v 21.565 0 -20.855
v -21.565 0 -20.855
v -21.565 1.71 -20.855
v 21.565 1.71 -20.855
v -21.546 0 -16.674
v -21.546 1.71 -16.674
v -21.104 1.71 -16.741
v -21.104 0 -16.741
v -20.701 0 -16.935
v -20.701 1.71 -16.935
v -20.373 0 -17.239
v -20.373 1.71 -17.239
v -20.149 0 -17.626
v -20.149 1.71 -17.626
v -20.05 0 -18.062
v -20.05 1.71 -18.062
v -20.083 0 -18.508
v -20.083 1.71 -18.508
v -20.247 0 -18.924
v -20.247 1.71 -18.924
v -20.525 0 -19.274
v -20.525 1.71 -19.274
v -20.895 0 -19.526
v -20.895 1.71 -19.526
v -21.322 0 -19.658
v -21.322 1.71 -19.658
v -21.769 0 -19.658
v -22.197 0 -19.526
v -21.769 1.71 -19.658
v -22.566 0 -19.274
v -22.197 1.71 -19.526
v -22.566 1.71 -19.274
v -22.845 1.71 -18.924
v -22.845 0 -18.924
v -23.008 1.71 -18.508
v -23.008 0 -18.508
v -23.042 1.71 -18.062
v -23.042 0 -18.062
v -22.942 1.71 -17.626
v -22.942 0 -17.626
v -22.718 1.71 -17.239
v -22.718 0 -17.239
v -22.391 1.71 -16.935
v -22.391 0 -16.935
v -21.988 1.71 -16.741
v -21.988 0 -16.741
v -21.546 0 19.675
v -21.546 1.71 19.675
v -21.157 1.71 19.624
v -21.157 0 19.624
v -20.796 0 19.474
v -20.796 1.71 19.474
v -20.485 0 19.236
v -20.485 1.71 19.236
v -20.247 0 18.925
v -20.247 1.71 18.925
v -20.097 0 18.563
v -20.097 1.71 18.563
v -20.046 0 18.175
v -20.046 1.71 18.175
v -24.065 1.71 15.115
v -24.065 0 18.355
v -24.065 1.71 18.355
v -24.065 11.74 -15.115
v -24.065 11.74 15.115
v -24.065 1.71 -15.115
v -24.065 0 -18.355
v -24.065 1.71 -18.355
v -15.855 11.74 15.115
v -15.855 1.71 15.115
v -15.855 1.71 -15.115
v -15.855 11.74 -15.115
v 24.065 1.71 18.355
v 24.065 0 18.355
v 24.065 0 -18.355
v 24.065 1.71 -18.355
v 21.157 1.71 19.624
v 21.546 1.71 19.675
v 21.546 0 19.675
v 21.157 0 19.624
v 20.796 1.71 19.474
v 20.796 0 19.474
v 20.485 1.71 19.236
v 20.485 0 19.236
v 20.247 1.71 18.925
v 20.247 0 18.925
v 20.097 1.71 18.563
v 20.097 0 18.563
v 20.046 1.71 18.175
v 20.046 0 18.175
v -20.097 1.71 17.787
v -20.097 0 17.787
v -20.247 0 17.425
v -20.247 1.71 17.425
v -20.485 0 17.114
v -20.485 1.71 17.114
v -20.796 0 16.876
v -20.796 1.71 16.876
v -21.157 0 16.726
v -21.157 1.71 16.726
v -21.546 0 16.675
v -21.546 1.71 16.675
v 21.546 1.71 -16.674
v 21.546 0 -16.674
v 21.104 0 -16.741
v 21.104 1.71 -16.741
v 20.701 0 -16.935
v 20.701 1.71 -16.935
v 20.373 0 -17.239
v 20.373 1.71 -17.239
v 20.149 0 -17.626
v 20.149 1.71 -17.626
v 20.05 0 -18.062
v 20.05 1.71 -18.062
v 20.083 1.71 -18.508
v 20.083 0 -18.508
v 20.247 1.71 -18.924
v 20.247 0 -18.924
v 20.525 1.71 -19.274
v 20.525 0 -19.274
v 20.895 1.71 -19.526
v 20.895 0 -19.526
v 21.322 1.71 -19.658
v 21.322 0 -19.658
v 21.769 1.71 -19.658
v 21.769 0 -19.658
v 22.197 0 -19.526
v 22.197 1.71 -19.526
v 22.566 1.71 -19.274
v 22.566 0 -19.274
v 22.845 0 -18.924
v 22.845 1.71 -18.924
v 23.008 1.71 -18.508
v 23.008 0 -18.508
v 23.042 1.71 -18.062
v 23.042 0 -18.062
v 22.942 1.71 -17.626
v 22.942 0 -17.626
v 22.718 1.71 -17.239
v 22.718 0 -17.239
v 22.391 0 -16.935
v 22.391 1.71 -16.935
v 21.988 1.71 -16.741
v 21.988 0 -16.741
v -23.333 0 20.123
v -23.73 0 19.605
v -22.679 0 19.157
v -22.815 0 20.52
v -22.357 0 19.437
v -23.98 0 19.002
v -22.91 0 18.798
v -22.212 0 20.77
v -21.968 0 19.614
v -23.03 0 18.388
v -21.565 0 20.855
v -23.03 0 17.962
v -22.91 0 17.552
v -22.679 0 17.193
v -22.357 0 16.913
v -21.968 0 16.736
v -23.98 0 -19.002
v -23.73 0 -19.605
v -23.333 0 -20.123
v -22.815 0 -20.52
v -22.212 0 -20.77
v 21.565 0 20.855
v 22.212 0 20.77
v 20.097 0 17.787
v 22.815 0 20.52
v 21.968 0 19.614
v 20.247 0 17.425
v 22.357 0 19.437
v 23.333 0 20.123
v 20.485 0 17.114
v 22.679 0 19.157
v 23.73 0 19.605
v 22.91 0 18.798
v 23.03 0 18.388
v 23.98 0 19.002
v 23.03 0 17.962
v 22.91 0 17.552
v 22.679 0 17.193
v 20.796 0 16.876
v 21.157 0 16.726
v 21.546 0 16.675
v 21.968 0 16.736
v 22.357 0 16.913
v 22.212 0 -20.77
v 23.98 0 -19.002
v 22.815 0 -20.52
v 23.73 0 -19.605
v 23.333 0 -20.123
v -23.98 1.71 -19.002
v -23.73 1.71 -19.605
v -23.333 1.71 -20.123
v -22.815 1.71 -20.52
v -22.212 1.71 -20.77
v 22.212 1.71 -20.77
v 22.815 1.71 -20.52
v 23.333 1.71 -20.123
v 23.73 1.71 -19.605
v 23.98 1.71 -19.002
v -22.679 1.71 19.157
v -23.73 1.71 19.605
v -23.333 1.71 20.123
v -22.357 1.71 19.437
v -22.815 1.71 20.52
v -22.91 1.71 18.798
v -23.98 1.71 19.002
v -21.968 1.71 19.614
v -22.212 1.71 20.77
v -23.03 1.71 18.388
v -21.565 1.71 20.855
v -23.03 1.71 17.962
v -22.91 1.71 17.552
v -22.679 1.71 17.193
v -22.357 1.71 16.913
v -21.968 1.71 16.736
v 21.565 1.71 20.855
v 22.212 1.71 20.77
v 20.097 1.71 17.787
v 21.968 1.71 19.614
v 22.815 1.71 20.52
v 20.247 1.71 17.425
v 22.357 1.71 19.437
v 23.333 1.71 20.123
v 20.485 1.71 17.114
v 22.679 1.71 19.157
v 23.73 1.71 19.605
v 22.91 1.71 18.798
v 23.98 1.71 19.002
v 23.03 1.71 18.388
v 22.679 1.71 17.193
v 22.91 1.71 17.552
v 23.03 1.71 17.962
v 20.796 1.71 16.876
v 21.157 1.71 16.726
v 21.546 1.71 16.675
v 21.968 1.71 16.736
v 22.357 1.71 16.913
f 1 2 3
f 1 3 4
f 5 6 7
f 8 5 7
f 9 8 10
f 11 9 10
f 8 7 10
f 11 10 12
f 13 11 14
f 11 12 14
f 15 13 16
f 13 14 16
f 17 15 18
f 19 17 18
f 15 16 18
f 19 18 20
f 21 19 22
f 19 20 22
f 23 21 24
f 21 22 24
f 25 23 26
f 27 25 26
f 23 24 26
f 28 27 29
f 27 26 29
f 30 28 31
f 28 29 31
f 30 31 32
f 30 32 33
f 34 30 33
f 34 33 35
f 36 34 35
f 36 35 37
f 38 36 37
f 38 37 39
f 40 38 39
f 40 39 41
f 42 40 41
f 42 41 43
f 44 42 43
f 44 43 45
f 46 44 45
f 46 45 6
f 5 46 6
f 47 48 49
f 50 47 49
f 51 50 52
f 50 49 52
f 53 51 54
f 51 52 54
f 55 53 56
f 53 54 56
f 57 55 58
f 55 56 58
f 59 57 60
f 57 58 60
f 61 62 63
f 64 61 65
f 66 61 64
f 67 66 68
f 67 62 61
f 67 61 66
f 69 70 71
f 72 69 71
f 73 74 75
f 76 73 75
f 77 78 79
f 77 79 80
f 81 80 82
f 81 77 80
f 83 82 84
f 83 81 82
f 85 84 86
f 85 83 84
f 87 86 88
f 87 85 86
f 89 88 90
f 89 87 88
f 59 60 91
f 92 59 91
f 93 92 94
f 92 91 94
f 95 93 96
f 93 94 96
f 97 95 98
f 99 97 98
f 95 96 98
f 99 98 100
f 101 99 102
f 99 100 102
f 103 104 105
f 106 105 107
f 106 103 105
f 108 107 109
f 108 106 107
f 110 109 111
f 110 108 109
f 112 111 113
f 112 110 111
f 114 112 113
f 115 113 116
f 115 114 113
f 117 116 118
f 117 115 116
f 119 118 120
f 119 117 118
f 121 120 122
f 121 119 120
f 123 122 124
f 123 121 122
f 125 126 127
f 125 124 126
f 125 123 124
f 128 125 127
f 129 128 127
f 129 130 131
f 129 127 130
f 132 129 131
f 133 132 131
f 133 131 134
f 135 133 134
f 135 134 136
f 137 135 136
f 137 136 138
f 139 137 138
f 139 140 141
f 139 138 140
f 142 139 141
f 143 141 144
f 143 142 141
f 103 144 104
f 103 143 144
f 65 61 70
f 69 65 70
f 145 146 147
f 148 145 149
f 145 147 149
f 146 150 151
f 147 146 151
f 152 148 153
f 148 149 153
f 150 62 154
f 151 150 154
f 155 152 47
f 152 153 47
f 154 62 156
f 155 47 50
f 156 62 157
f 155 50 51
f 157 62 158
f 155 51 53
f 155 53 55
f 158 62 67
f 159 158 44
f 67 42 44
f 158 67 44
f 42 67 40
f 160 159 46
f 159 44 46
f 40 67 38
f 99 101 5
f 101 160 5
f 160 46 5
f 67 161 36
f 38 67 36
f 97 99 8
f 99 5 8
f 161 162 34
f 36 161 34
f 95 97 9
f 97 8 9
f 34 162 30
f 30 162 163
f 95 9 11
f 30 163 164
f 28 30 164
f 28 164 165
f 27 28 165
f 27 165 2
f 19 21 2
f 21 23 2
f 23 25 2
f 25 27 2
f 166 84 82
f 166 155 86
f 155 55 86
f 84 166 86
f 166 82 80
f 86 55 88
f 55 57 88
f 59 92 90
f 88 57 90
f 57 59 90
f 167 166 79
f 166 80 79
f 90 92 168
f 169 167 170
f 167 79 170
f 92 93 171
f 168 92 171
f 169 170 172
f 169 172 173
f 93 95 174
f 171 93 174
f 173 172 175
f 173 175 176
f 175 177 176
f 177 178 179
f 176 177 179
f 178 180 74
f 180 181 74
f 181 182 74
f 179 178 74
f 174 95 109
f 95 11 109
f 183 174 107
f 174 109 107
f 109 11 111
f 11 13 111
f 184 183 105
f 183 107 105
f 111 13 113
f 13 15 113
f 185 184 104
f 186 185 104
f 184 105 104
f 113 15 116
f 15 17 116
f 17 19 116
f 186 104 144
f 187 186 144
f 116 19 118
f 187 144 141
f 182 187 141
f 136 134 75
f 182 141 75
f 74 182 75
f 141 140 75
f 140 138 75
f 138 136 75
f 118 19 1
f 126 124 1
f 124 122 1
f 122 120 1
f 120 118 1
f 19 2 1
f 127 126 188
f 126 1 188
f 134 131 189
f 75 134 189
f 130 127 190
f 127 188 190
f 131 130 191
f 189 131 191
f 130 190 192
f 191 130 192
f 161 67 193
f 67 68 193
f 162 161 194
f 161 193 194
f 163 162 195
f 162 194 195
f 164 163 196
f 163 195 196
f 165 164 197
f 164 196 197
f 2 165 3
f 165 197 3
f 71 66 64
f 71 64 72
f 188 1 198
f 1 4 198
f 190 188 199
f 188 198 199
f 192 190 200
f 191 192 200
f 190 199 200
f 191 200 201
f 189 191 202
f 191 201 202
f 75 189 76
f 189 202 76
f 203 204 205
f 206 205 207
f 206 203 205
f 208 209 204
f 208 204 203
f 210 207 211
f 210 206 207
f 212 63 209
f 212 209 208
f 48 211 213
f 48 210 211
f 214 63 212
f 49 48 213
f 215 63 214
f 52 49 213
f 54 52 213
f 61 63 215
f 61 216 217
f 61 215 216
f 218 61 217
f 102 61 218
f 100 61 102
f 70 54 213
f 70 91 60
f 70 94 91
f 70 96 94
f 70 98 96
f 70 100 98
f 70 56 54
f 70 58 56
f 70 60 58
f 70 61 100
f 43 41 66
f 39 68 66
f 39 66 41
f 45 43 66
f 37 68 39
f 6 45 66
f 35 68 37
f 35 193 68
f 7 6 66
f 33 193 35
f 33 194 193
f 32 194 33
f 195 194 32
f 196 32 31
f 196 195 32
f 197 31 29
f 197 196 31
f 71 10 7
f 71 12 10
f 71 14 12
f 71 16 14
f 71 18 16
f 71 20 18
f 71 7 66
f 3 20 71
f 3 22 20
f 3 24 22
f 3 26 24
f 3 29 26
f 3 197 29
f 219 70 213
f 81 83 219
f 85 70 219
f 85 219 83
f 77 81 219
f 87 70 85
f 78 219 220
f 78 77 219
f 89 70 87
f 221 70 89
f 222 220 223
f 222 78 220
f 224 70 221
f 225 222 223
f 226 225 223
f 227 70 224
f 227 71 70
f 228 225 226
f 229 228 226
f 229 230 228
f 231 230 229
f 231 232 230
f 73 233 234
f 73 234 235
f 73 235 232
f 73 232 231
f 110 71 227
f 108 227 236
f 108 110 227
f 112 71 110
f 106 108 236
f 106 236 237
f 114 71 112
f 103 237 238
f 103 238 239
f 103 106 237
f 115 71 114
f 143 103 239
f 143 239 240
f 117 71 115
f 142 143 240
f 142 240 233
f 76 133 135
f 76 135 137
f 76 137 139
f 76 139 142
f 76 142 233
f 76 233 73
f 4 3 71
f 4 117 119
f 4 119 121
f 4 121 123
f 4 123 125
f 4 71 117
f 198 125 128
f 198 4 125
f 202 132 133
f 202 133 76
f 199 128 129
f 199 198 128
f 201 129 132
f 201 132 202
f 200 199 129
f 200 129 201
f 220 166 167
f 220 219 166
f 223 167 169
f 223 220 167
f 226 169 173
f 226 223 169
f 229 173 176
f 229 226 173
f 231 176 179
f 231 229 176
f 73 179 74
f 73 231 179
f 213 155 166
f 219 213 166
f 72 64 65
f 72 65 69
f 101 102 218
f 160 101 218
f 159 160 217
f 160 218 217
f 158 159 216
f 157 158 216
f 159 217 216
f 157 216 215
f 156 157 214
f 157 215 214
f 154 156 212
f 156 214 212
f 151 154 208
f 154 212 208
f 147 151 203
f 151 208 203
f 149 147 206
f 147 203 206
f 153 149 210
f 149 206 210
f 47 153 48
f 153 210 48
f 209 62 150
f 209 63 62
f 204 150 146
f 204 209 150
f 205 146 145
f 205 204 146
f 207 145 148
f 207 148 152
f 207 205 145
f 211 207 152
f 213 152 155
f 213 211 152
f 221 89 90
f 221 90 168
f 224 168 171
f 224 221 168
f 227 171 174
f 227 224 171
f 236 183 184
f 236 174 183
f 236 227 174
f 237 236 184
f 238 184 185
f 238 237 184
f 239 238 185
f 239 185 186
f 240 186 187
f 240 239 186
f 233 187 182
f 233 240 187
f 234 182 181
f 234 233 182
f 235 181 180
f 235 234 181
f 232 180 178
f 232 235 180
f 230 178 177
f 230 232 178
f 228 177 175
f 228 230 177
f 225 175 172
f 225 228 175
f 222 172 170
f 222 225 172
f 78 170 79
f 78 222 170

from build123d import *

# Parameters (mm, degrees)
SKETCH2_W           = 48.13
SKETCH2_H           = 41.71
BOSS_EXTRUDE1_DEPTH = 1.71
SKETCH3_R           = 1.5
CUT_EXTRUDE1_DEPTH  = 10.71
CUT_EXTRUDE2_DEPTH  = 10.71
FILLET3_R           = 2.5
SKETCH8_W           = 8.21
SKETCH8_H           = 30.23
BOSS_EXTRUDE2_DEPTH = 10.03


with BuildPart() as part:
    # Sketch2 → Boss-Extrude1 (new body)
    with BuildSketch(Plane(origin=(0, 0, 0), x_dir=(1, 0, 0), z_dir=(0, 1, 0))):
        Rectangle(SKETCH2_W, SKETCH2_H)
    extrude(amount=BOSS_EXTRUDE1_DEPTH)

    # Sketch3 → Cut-Extrude1 (cut)
    with BuildSketch(Plane(origin=(0, 1.71, 0), x_dir=(1, 0, 0), z_dir=(0, 1, 0))):
        with Locations(Location((-21.545702182, 18.174313444, 0), (0, 0, 270))):
            Circle(SKETCH3_R)
    cut_extrude1 = extrude(amount=-CUT_EXTRUDE1_DEPTH, mode=Mode.SUBTRACT)

    # Sketch4 → Cut-Extrude2 (cut)
    with BuildSketch(Plane(origin=(0, 1.71, 0), x_dir=(1, 0, 0), z_dir=(0, 1, 0))):
        with BuildLine():
            ThreePointArc((-20.045702182, -18.175), (-20.485042011, -17.114339828), (-21.545702182, -16.675))
            Line((-21.545702182, -16.675), (-21.545702182, -18.175))
            Line((-21.545702182, -18.175), (-21.545702182, -19.675))
            ThreePointArc((-21.545702182, -19.675), (-20.485042011, -19.235660172), (-20.045702182, -18.175))
        make_face()
        with BuildLine():
            Line((-21.545702182, -18.175), (-21.545702182, -16.675))
            ThreePointArc((-21.545702182, -16.675), (-23.045702182, -18.175), (-21.545702182, -19.675))
            Line((-21.545702182, -19.675), (-21.545702182, -18.175))
        make_face()
    cut_extrude2 = extrude(amount=-CUT_EXTRUDE2_DEPTH, mode=Mode.SUBTRACT)

    # Fillet3
    fillet3_edges = [part.edges().sort_by_distance(p)[0] for p in [
        (24.065, 0.855, 20.855),
        (-24.065, 0.855, 20.855),
        (-24.065, 0.855, -20.855),
        (24.065, 0.855, -20.855),
    ]]
    fillet(fillet3_edges, radius=FILLET3_R)

    # Mirror1: Cut-Extrude1, Cut-Extrude2 across plane
    add(cut_extrude1.mirror(Plane(origin=(0, 0, 0), x_dir=(0, 0, 1), z_dir=(1, 0, 0))), mode=Mode.SUBTRACT)
    add(cut_extrude2.mirror(Plane(origin=(0, 0, 0), x_dir=(0, 0, 1), z_dir=(1, 0, 0))), mode=Mode.SUBTRACT)

    # Sketch8 → Boss-Extrude2 (add)
    with BuildSketch(Plane(origin=(0, 1.71, 0), x_dir=(1, 0, 0), z_dir=(0, 1, 0))):
        with Locations((-19.96, 0)):
            Rectangle(SKETCH8_W, SKETCH8_H)
    extrude(amount=BOSS_EXTRUDE2_DEPTH)


solid = part.part
